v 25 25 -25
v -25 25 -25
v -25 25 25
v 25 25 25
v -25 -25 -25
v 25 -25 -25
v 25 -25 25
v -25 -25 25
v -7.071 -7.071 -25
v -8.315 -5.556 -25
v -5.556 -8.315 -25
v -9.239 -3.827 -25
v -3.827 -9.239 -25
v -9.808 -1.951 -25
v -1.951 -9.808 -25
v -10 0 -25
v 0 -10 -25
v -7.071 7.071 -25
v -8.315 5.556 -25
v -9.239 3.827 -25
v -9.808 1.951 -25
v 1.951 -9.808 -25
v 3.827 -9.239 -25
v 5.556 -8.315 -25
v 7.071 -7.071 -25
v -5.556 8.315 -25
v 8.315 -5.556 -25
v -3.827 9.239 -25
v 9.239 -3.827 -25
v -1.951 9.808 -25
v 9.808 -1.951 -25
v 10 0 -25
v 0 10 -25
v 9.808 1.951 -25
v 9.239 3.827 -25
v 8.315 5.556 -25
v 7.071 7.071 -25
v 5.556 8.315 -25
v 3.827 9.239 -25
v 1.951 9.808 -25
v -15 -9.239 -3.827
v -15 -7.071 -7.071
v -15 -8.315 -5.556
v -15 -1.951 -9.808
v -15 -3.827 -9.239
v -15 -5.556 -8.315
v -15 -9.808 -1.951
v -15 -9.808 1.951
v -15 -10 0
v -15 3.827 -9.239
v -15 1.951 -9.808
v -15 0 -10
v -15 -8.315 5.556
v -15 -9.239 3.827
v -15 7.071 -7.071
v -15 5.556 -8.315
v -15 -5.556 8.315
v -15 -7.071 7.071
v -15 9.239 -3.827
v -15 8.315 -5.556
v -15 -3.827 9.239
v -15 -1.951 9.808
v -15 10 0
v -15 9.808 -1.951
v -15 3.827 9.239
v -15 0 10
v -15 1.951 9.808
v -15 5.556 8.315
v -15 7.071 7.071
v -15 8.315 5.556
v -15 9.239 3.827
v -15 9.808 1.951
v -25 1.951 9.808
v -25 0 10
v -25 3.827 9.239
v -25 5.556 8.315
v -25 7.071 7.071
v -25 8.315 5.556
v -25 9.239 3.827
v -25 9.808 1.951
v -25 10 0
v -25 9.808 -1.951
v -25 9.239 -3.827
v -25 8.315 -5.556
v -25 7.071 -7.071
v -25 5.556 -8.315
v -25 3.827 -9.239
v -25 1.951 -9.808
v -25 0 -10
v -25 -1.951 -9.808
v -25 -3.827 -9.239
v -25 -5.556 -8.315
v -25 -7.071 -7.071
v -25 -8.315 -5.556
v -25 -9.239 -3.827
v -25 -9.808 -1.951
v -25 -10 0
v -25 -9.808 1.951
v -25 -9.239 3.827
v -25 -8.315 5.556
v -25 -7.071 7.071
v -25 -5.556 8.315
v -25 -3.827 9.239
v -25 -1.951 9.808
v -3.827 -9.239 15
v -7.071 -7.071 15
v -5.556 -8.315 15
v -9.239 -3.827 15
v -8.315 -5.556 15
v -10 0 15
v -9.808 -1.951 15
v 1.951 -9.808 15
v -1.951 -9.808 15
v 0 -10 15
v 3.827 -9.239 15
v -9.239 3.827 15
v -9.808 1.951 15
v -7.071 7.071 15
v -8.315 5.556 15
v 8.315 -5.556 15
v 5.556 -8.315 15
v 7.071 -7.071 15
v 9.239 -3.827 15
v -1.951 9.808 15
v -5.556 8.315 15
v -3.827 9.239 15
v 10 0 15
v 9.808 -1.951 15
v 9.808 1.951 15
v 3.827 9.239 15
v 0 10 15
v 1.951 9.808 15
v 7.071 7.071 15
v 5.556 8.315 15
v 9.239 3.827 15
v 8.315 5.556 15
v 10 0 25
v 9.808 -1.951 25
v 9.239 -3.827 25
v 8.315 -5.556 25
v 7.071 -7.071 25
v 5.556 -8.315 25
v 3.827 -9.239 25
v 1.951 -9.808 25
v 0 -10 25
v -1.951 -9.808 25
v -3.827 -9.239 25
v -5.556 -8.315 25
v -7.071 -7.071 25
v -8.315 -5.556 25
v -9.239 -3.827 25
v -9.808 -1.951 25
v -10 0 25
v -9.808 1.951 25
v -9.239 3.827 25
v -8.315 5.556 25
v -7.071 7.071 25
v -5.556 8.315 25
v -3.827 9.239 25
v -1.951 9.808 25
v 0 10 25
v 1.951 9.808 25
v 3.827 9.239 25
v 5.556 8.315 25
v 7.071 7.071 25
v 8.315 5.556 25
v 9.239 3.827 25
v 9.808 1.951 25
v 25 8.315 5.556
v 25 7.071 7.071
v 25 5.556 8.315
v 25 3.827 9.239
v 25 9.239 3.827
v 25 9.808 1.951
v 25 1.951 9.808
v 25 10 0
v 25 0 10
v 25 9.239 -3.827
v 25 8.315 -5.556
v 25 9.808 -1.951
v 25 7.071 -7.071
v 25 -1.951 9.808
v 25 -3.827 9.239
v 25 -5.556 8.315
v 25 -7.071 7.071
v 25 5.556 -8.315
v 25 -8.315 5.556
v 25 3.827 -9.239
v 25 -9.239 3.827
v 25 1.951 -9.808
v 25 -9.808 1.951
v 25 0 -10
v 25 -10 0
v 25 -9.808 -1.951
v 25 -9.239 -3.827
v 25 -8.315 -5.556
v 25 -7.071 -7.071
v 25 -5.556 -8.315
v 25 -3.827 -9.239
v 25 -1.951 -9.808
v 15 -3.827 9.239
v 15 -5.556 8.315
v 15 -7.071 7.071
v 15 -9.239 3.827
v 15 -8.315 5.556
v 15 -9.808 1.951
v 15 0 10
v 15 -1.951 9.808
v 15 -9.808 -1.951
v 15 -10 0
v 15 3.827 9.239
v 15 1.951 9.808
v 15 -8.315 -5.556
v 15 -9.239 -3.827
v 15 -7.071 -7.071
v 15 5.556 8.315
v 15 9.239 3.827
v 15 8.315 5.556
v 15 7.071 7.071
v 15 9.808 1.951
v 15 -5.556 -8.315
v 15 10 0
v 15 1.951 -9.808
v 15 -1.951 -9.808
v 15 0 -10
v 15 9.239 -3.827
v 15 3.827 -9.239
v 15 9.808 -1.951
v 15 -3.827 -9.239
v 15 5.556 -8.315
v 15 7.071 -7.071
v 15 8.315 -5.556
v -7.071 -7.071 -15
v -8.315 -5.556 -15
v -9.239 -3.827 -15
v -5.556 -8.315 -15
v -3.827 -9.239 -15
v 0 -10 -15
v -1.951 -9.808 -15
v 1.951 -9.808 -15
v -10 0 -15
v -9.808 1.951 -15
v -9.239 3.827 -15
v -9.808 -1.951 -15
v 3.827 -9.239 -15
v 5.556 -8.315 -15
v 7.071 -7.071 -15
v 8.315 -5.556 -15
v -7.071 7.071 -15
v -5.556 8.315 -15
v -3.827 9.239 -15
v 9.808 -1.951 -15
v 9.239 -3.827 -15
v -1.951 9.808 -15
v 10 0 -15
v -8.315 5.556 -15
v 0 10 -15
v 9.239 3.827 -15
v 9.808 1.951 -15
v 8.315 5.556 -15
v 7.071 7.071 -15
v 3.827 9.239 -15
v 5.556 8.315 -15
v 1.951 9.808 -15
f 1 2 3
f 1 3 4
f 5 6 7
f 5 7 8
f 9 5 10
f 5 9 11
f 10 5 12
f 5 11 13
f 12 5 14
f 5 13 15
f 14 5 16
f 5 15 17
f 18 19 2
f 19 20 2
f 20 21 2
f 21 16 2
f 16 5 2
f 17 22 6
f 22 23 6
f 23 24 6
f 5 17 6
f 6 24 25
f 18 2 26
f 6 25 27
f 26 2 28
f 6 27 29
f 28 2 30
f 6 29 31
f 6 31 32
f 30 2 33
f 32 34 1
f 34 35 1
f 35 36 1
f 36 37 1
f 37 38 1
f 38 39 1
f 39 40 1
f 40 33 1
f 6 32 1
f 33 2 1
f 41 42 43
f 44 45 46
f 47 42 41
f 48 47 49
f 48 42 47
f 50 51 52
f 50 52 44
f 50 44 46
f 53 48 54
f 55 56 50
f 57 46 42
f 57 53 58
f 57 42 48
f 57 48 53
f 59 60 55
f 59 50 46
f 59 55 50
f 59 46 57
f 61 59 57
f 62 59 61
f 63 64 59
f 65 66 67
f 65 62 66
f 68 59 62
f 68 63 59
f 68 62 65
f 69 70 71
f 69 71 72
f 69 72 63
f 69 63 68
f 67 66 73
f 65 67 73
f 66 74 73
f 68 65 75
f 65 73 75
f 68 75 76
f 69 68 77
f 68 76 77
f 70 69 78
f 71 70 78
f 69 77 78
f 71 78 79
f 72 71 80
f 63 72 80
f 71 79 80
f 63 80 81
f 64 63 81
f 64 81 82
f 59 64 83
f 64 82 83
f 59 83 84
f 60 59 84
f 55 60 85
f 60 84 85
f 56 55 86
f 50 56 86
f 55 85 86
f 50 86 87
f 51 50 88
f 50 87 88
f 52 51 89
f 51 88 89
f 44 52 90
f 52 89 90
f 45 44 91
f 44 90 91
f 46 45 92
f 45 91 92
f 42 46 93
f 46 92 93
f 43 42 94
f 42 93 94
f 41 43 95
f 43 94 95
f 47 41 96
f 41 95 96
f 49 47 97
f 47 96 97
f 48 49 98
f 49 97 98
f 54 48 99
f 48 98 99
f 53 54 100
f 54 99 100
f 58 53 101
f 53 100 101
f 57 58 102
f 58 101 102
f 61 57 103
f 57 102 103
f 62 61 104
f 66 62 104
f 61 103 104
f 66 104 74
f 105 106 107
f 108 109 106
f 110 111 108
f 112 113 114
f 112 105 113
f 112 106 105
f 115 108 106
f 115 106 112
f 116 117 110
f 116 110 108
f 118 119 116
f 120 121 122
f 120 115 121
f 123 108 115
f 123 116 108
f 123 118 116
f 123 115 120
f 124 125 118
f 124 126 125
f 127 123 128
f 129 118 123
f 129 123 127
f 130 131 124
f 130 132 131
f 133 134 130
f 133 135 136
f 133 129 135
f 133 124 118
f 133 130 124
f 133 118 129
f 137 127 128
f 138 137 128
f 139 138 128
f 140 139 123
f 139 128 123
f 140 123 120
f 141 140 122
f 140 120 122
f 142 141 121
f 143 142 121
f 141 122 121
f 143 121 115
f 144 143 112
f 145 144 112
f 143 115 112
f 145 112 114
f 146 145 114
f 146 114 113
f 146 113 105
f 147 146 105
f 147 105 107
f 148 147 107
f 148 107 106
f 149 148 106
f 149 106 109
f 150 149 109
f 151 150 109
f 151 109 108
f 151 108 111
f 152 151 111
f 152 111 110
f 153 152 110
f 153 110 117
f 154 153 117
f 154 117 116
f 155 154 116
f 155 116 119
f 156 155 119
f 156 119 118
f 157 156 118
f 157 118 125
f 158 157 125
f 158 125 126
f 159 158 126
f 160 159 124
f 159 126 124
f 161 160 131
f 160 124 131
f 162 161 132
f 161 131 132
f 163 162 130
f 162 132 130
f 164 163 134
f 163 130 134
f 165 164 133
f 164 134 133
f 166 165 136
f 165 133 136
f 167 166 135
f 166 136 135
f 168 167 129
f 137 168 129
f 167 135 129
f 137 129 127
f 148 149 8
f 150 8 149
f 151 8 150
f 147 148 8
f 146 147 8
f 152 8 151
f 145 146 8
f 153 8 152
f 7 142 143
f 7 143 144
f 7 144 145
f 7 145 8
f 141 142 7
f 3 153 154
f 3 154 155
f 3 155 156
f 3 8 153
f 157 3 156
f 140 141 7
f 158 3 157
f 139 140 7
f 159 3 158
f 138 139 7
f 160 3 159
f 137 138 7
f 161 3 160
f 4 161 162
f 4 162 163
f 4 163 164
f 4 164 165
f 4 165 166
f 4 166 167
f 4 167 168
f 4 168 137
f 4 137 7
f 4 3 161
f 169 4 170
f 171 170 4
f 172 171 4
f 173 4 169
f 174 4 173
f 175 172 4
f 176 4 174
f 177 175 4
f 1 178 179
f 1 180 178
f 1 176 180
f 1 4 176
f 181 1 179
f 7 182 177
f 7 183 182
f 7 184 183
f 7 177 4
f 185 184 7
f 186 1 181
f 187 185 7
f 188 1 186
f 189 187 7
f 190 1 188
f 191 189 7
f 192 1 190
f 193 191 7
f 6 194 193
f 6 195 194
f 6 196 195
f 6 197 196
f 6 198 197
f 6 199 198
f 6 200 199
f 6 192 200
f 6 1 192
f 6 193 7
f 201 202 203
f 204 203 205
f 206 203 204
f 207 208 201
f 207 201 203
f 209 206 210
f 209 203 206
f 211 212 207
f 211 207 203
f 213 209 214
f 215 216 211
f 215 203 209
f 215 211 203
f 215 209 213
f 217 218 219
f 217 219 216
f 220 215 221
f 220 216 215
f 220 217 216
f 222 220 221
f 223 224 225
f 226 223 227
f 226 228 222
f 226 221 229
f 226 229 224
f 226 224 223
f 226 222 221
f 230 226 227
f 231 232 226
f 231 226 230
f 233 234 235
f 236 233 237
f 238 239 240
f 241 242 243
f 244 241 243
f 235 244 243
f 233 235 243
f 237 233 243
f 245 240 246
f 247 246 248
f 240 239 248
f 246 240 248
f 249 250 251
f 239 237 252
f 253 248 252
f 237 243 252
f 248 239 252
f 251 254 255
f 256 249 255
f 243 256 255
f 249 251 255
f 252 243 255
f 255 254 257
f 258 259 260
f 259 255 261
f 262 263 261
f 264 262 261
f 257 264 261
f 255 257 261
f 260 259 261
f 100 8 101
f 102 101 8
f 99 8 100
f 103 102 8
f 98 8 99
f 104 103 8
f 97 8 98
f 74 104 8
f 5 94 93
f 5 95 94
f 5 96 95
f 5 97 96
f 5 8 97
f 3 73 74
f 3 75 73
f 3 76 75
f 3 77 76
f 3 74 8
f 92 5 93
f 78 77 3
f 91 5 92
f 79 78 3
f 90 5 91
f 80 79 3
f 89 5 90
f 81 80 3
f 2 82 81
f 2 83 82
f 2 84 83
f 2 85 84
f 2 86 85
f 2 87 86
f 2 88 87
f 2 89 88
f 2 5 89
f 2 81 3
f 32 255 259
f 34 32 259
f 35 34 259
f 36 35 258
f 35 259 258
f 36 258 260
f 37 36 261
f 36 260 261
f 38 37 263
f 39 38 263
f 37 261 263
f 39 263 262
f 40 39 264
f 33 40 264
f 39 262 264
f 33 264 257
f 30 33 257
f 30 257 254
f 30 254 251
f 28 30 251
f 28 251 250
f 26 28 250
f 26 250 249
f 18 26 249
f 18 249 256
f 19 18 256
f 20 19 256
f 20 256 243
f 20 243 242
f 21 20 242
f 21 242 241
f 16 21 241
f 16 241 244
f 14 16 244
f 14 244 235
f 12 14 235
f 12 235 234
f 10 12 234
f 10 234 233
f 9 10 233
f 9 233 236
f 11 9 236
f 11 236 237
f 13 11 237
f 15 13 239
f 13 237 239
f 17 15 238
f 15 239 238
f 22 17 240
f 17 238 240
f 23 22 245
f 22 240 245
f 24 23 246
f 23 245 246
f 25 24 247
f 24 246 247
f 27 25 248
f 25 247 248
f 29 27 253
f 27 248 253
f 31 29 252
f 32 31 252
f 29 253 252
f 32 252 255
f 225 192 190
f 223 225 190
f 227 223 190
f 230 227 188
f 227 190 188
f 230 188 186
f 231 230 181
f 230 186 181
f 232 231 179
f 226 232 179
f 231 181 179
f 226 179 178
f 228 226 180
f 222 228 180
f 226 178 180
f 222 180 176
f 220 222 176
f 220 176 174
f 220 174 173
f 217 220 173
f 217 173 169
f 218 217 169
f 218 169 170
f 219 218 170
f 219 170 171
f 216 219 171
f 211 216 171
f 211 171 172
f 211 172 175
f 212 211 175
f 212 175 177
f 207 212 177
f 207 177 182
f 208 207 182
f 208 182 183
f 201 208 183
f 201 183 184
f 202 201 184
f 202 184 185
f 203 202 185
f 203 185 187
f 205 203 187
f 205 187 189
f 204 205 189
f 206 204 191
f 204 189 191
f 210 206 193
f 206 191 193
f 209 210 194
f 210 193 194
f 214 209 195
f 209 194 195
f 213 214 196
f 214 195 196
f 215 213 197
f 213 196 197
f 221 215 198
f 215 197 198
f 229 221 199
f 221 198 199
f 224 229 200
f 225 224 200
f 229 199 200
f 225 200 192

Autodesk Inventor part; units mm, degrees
ref_plane "YZ Plane" through (0, 0, 0) normal (1, 0, 0) x (0, 1, 0)
ref_plane "XZ Plane" through (0, 0, 0) normal (0, 1, 0) x (-1, 0, 0)
ref_plane "XY Plane" through (0, 0, 0) normal (0, 0, 1) x (1, 0, 0)
sketch "Sketch1" plane through (0, 0, 0) normal (1, 0, 0) x (0, 1, 0)
  line L0 (31.9501, 0) -> (-31.3732, 0)
  line L1 (0, 29.3537) -> (0, -50.8461) construction
  line L2 (25, 25) -> (-25, 25)
  line L3 (-25, 25) -> (-25, -25)
  line L4 (-25, -25) -> (25, -25)
  line L5 (25, -25) -> (25, 25)
  circle A0 centre (0.2885, 0) radius 10
  point P0 (0, 0)
  dimension "d0" = 50
  dimension "d1" = 50
  dimension "d3" = 50
  dimension "d4" = 50
  dimension "d5" = 20
sketch "Sketch2" plane through (0, 0, 0) normal (0, 0, 1) x (1, 0, 0)
  line L0 (0, 17.9809) -> (0, -21.5338)
  line L1 (-16.5078, 0) -> (19.6274, 0)
  line L2 (-25, 25) -> (25, 25)
  line L3 (25, 25) -> (25, -25)
  line L4 (25, -25) -> (-25, -25)
  line L5 (-25, -25) -> (-25, 25)
  circle A0 centre (0, 0) radius 10
  dimension "d6" = 50
  dimension "d7" = 50
  dimension "d8" = 25
  dimension "d9" = 50
  dimension "d10" = 20
extrude "Extrusion1" add sketch "Sketch2" along normal mid plane 50
extrude "Extrusion2" add sketch "Sketch2" along normal mid plane 30 contours A0 L1 L0 | L0 L1 A0 | L1 A0 L0 | L0 A0 L1
sketch "Sketch3" plane through (-25, -25, 25) normal (-1, 0, 0) x (0, 0, 1)
  circle A0 centre (-25, 25) radius 10
  dimension "d15" = 20
extrude "Extrusion3" cut sketch "Sketch3" against normal blind 10
sketch "Sketch4" plane through (25, -25, 25) normal (1, 0, 0) x (0, 0, -1)
  circle A0 centre (25, 25) radius 10
  dimension "d18" = 20
extrude "Extrusion4" cut sketch "Sketch4" against normal blind 10
properties part number "CT_02"
